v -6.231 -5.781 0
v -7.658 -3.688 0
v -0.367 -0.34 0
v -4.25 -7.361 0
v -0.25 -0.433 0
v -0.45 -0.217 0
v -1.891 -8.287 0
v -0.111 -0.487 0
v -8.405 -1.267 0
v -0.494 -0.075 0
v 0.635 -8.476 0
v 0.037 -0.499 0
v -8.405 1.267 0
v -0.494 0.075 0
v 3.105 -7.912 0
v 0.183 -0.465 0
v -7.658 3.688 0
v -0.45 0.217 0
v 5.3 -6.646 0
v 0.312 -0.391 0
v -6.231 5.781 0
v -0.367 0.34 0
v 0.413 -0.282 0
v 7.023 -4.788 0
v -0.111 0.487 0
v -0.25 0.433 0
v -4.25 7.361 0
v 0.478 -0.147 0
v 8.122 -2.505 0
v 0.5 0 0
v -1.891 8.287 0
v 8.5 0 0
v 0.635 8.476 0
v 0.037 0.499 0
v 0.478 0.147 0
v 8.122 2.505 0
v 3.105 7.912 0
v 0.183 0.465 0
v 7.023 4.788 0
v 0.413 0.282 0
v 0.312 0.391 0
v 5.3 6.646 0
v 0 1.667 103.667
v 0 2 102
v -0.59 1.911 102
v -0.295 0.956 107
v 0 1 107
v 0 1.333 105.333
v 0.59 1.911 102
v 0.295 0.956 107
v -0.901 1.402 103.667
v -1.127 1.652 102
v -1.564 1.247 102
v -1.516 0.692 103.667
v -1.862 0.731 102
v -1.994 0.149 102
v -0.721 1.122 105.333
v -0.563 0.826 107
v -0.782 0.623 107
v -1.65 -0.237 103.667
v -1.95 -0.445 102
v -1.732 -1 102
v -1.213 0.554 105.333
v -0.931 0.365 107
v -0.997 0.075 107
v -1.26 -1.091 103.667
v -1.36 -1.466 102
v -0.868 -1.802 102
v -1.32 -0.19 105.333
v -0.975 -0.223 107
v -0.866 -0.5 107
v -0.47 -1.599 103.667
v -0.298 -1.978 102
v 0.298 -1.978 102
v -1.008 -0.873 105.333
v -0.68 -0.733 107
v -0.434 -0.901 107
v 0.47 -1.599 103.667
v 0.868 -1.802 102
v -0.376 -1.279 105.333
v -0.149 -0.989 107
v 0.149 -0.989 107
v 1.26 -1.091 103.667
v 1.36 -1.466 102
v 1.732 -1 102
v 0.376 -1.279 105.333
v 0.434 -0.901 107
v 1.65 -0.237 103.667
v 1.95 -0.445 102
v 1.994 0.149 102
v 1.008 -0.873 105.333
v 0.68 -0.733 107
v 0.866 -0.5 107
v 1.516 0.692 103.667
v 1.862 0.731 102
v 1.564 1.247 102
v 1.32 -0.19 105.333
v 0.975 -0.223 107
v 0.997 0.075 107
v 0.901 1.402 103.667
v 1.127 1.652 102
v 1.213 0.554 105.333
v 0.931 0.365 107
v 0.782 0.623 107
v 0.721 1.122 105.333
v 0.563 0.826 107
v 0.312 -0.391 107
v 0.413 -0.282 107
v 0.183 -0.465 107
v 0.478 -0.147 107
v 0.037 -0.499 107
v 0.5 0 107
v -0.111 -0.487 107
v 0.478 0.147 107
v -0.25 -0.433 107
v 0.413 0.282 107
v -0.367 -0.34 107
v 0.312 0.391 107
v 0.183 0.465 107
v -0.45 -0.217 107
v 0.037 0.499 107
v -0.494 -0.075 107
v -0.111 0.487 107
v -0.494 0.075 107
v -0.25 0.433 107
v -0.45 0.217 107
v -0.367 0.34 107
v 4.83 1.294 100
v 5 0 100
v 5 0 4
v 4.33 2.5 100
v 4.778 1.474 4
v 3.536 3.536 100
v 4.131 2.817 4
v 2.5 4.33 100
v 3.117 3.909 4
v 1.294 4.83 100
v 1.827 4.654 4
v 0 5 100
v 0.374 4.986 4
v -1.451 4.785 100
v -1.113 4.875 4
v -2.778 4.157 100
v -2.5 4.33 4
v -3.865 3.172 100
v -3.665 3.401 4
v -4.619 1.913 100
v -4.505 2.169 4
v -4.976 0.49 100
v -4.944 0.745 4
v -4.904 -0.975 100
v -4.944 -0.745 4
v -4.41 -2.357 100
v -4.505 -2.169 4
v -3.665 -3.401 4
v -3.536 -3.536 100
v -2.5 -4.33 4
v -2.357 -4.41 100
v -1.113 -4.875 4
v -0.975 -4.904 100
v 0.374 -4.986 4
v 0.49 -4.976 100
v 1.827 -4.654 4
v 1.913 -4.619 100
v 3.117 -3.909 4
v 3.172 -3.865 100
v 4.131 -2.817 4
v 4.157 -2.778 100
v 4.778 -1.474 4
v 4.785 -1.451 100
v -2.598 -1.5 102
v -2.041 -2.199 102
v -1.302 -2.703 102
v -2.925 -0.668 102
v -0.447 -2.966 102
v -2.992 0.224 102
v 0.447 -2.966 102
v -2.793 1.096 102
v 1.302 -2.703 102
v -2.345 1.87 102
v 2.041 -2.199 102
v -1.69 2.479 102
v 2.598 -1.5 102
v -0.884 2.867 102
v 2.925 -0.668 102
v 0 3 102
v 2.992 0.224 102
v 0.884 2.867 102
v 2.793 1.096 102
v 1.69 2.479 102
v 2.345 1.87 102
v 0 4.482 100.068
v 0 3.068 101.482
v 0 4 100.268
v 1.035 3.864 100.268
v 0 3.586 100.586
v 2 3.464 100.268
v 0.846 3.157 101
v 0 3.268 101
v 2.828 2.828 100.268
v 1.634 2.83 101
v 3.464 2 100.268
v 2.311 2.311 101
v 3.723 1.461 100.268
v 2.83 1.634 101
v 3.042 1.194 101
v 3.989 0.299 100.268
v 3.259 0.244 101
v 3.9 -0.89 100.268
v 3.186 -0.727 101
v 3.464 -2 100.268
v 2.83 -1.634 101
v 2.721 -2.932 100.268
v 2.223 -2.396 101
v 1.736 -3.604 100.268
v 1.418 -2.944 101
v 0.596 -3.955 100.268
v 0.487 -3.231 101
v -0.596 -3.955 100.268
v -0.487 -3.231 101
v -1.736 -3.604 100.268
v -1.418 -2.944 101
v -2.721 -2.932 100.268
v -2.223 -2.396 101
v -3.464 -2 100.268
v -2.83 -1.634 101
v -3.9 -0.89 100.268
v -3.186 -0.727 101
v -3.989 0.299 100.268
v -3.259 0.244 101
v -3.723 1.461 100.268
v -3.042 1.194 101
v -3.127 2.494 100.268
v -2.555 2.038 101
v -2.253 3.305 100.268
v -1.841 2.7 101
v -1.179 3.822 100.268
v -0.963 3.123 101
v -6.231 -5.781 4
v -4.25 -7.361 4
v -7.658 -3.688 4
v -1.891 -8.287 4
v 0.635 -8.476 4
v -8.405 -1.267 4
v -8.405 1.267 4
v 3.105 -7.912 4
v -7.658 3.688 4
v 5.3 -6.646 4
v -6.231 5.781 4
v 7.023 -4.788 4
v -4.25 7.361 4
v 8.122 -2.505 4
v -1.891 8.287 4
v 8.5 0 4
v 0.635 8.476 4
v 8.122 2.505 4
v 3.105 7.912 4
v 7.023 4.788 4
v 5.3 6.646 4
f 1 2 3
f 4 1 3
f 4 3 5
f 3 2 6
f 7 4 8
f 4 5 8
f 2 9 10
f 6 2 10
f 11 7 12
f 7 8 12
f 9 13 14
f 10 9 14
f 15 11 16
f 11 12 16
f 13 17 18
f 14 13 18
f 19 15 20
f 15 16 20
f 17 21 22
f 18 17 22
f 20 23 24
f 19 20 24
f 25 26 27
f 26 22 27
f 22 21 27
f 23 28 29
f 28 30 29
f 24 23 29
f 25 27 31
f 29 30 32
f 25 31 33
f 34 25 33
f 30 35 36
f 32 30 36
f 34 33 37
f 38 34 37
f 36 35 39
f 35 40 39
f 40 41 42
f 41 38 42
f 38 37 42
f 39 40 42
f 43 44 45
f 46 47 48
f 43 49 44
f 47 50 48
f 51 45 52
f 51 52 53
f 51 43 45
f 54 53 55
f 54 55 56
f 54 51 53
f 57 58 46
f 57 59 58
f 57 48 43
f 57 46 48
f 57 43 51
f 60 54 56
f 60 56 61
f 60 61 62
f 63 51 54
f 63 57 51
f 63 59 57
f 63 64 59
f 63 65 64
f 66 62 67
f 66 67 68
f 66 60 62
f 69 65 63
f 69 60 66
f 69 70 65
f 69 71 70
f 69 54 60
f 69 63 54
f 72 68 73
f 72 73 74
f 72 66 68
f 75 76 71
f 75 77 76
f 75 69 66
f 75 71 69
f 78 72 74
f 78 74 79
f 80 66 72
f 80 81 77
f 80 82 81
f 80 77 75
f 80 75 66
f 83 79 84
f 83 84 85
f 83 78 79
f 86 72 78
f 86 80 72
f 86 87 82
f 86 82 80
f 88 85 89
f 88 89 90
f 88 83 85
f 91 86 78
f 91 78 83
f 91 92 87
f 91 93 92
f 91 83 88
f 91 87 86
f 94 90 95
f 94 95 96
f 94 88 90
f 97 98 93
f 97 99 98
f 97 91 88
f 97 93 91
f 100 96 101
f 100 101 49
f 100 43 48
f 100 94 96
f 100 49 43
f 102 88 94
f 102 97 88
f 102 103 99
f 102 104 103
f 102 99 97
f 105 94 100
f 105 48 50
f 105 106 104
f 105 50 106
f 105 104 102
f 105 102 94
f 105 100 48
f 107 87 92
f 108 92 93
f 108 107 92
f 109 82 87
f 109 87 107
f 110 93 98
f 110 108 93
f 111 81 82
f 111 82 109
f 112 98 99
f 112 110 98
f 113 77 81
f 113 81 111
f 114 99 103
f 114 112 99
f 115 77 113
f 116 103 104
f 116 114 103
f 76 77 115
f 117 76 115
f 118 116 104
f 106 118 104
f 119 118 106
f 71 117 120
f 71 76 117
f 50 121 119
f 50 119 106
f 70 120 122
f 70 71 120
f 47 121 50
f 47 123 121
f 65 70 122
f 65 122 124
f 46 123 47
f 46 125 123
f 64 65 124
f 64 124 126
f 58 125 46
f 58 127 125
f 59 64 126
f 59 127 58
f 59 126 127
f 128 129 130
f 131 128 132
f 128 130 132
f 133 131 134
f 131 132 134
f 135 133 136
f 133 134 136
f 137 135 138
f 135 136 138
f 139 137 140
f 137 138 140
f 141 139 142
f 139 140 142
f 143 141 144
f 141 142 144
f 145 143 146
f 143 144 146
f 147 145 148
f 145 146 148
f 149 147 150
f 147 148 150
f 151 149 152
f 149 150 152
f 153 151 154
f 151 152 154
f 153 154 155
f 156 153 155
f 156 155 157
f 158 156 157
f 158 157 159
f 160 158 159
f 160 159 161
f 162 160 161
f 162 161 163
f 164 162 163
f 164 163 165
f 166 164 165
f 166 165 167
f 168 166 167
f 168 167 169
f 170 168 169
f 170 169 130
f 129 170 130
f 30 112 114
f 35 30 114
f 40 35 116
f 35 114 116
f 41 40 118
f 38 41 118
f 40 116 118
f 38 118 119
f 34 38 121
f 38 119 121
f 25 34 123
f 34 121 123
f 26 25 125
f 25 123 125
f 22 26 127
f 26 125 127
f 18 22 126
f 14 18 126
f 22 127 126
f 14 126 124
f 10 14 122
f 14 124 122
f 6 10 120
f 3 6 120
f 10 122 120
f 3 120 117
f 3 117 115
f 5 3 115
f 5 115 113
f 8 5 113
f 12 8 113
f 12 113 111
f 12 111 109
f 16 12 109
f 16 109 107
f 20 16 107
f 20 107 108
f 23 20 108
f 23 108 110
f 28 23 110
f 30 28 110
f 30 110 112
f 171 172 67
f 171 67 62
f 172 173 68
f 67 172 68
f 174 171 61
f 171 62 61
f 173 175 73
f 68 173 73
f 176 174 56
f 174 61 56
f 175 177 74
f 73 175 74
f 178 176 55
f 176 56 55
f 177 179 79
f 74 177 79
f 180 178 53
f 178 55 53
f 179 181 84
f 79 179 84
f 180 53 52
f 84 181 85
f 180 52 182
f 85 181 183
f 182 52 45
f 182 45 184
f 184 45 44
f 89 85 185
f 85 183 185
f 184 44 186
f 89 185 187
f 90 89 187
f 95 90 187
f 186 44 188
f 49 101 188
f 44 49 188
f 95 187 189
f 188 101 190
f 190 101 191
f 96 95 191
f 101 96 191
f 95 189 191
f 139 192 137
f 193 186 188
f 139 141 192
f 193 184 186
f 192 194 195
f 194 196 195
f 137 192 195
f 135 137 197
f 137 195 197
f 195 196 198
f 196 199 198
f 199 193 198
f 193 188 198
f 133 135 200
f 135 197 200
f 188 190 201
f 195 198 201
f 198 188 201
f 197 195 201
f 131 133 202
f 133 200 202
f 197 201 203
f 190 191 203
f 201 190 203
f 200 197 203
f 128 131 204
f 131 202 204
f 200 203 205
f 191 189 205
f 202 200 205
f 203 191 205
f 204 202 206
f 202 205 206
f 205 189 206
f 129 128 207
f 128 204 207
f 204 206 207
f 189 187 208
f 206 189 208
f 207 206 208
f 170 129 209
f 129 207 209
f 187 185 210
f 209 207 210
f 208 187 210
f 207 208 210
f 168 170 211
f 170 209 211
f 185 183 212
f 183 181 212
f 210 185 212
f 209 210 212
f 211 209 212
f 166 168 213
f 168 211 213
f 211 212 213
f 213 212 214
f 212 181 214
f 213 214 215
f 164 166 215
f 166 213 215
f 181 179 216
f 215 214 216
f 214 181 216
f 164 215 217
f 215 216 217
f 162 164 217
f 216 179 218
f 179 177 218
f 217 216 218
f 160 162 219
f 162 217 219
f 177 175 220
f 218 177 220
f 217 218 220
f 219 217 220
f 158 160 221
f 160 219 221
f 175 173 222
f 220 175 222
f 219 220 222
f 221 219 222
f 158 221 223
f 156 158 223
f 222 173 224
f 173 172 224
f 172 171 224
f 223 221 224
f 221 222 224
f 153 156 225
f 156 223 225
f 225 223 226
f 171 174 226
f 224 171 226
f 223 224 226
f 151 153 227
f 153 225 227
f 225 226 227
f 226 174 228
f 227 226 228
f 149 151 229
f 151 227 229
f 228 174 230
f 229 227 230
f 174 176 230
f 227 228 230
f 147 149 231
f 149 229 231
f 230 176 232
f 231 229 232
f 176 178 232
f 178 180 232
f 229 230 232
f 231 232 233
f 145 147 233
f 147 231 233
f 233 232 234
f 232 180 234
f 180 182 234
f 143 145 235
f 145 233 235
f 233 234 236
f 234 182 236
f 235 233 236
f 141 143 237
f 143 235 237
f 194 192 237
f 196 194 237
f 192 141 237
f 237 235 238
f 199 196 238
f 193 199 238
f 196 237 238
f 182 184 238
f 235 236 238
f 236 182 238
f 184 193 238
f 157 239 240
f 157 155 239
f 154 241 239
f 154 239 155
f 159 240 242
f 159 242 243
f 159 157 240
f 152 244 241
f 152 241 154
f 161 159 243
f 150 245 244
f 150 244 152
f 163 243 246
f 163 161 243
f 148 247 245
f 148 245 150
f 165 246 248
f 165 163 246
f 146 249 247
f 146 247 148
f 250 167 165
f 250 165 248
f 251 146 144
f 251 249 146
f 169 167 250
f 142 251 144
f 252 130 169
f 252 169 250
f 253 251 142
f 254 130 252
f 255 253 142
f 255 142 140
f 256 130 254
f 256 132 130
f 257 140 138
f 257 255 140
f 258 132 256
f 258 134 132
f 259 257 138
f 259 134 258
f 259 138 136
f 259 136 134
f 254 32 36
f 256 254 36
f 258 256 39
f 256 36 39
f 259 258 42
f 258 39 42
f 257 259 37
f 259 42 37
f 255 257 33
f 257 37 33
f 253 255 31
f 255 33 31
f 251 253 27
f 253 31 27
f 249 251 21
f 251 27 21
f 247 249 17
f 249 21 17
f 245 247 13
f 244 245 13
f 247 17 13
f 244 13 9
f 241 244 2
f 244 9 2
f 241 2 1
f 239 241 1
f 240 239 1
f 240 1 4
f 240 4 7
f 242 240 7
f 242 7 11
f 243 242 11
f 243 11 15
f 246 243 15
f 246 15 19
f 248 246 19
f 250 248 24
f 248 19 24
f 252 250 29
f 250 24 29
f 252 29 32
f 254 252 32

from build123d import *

# Parameters (mm, degrees)
F0_R     = 8.5
F1_DEPTH = 4
F2_R     = 5
F3_DEPTH = 100
F8_R     = 0.5
F9_DEPTH = 129.4


with BuildPart() as f1:
    # F0 (on Top) → F1 (new body)
    with BuildSketch(Plane.XY):
        Circle(F0_R)
    extrude(amount=F1_DEPTH)

    # F2 (on Top) → F3 (join)
    with BuildSketch(Plane.XY):
        Circle(F2_R)
    extrude(amount=F3_DEPTH)

    # F4 (on Right) → F5 (revolve)
    with BuildSketch(Plane.YZ):
        with BuildLine():
            Line((3, 102), (0, 102))
            Line((0, 102), (0, 100))
            Line((0, 100), (5, 100))
            ThreePointArc((5, 100), (3.585786, 100.585786), (3, 102))
        make_face()
    revolve(axis=Axis((0, 0, 101), (0, 0, -1)))

    # F6 (on Right) → F7 (revolve)
    with BuildSketch(Plane.YZ):
        Polygon((0, 107), (0, 102), (2, 102), (1, 107), align=None)
    revolve(axis=Axis((0, 0, 104.5), (0, 0, 1)))

    # F8 (on face) → F9 (cut)
    with BuildSketch(Plane.XY.offset(107)):
        Circle(F8_R)
    extrude(amount=-F9_DEPTH, mode=Mode.SUBTRACT)


solid = f1.part
